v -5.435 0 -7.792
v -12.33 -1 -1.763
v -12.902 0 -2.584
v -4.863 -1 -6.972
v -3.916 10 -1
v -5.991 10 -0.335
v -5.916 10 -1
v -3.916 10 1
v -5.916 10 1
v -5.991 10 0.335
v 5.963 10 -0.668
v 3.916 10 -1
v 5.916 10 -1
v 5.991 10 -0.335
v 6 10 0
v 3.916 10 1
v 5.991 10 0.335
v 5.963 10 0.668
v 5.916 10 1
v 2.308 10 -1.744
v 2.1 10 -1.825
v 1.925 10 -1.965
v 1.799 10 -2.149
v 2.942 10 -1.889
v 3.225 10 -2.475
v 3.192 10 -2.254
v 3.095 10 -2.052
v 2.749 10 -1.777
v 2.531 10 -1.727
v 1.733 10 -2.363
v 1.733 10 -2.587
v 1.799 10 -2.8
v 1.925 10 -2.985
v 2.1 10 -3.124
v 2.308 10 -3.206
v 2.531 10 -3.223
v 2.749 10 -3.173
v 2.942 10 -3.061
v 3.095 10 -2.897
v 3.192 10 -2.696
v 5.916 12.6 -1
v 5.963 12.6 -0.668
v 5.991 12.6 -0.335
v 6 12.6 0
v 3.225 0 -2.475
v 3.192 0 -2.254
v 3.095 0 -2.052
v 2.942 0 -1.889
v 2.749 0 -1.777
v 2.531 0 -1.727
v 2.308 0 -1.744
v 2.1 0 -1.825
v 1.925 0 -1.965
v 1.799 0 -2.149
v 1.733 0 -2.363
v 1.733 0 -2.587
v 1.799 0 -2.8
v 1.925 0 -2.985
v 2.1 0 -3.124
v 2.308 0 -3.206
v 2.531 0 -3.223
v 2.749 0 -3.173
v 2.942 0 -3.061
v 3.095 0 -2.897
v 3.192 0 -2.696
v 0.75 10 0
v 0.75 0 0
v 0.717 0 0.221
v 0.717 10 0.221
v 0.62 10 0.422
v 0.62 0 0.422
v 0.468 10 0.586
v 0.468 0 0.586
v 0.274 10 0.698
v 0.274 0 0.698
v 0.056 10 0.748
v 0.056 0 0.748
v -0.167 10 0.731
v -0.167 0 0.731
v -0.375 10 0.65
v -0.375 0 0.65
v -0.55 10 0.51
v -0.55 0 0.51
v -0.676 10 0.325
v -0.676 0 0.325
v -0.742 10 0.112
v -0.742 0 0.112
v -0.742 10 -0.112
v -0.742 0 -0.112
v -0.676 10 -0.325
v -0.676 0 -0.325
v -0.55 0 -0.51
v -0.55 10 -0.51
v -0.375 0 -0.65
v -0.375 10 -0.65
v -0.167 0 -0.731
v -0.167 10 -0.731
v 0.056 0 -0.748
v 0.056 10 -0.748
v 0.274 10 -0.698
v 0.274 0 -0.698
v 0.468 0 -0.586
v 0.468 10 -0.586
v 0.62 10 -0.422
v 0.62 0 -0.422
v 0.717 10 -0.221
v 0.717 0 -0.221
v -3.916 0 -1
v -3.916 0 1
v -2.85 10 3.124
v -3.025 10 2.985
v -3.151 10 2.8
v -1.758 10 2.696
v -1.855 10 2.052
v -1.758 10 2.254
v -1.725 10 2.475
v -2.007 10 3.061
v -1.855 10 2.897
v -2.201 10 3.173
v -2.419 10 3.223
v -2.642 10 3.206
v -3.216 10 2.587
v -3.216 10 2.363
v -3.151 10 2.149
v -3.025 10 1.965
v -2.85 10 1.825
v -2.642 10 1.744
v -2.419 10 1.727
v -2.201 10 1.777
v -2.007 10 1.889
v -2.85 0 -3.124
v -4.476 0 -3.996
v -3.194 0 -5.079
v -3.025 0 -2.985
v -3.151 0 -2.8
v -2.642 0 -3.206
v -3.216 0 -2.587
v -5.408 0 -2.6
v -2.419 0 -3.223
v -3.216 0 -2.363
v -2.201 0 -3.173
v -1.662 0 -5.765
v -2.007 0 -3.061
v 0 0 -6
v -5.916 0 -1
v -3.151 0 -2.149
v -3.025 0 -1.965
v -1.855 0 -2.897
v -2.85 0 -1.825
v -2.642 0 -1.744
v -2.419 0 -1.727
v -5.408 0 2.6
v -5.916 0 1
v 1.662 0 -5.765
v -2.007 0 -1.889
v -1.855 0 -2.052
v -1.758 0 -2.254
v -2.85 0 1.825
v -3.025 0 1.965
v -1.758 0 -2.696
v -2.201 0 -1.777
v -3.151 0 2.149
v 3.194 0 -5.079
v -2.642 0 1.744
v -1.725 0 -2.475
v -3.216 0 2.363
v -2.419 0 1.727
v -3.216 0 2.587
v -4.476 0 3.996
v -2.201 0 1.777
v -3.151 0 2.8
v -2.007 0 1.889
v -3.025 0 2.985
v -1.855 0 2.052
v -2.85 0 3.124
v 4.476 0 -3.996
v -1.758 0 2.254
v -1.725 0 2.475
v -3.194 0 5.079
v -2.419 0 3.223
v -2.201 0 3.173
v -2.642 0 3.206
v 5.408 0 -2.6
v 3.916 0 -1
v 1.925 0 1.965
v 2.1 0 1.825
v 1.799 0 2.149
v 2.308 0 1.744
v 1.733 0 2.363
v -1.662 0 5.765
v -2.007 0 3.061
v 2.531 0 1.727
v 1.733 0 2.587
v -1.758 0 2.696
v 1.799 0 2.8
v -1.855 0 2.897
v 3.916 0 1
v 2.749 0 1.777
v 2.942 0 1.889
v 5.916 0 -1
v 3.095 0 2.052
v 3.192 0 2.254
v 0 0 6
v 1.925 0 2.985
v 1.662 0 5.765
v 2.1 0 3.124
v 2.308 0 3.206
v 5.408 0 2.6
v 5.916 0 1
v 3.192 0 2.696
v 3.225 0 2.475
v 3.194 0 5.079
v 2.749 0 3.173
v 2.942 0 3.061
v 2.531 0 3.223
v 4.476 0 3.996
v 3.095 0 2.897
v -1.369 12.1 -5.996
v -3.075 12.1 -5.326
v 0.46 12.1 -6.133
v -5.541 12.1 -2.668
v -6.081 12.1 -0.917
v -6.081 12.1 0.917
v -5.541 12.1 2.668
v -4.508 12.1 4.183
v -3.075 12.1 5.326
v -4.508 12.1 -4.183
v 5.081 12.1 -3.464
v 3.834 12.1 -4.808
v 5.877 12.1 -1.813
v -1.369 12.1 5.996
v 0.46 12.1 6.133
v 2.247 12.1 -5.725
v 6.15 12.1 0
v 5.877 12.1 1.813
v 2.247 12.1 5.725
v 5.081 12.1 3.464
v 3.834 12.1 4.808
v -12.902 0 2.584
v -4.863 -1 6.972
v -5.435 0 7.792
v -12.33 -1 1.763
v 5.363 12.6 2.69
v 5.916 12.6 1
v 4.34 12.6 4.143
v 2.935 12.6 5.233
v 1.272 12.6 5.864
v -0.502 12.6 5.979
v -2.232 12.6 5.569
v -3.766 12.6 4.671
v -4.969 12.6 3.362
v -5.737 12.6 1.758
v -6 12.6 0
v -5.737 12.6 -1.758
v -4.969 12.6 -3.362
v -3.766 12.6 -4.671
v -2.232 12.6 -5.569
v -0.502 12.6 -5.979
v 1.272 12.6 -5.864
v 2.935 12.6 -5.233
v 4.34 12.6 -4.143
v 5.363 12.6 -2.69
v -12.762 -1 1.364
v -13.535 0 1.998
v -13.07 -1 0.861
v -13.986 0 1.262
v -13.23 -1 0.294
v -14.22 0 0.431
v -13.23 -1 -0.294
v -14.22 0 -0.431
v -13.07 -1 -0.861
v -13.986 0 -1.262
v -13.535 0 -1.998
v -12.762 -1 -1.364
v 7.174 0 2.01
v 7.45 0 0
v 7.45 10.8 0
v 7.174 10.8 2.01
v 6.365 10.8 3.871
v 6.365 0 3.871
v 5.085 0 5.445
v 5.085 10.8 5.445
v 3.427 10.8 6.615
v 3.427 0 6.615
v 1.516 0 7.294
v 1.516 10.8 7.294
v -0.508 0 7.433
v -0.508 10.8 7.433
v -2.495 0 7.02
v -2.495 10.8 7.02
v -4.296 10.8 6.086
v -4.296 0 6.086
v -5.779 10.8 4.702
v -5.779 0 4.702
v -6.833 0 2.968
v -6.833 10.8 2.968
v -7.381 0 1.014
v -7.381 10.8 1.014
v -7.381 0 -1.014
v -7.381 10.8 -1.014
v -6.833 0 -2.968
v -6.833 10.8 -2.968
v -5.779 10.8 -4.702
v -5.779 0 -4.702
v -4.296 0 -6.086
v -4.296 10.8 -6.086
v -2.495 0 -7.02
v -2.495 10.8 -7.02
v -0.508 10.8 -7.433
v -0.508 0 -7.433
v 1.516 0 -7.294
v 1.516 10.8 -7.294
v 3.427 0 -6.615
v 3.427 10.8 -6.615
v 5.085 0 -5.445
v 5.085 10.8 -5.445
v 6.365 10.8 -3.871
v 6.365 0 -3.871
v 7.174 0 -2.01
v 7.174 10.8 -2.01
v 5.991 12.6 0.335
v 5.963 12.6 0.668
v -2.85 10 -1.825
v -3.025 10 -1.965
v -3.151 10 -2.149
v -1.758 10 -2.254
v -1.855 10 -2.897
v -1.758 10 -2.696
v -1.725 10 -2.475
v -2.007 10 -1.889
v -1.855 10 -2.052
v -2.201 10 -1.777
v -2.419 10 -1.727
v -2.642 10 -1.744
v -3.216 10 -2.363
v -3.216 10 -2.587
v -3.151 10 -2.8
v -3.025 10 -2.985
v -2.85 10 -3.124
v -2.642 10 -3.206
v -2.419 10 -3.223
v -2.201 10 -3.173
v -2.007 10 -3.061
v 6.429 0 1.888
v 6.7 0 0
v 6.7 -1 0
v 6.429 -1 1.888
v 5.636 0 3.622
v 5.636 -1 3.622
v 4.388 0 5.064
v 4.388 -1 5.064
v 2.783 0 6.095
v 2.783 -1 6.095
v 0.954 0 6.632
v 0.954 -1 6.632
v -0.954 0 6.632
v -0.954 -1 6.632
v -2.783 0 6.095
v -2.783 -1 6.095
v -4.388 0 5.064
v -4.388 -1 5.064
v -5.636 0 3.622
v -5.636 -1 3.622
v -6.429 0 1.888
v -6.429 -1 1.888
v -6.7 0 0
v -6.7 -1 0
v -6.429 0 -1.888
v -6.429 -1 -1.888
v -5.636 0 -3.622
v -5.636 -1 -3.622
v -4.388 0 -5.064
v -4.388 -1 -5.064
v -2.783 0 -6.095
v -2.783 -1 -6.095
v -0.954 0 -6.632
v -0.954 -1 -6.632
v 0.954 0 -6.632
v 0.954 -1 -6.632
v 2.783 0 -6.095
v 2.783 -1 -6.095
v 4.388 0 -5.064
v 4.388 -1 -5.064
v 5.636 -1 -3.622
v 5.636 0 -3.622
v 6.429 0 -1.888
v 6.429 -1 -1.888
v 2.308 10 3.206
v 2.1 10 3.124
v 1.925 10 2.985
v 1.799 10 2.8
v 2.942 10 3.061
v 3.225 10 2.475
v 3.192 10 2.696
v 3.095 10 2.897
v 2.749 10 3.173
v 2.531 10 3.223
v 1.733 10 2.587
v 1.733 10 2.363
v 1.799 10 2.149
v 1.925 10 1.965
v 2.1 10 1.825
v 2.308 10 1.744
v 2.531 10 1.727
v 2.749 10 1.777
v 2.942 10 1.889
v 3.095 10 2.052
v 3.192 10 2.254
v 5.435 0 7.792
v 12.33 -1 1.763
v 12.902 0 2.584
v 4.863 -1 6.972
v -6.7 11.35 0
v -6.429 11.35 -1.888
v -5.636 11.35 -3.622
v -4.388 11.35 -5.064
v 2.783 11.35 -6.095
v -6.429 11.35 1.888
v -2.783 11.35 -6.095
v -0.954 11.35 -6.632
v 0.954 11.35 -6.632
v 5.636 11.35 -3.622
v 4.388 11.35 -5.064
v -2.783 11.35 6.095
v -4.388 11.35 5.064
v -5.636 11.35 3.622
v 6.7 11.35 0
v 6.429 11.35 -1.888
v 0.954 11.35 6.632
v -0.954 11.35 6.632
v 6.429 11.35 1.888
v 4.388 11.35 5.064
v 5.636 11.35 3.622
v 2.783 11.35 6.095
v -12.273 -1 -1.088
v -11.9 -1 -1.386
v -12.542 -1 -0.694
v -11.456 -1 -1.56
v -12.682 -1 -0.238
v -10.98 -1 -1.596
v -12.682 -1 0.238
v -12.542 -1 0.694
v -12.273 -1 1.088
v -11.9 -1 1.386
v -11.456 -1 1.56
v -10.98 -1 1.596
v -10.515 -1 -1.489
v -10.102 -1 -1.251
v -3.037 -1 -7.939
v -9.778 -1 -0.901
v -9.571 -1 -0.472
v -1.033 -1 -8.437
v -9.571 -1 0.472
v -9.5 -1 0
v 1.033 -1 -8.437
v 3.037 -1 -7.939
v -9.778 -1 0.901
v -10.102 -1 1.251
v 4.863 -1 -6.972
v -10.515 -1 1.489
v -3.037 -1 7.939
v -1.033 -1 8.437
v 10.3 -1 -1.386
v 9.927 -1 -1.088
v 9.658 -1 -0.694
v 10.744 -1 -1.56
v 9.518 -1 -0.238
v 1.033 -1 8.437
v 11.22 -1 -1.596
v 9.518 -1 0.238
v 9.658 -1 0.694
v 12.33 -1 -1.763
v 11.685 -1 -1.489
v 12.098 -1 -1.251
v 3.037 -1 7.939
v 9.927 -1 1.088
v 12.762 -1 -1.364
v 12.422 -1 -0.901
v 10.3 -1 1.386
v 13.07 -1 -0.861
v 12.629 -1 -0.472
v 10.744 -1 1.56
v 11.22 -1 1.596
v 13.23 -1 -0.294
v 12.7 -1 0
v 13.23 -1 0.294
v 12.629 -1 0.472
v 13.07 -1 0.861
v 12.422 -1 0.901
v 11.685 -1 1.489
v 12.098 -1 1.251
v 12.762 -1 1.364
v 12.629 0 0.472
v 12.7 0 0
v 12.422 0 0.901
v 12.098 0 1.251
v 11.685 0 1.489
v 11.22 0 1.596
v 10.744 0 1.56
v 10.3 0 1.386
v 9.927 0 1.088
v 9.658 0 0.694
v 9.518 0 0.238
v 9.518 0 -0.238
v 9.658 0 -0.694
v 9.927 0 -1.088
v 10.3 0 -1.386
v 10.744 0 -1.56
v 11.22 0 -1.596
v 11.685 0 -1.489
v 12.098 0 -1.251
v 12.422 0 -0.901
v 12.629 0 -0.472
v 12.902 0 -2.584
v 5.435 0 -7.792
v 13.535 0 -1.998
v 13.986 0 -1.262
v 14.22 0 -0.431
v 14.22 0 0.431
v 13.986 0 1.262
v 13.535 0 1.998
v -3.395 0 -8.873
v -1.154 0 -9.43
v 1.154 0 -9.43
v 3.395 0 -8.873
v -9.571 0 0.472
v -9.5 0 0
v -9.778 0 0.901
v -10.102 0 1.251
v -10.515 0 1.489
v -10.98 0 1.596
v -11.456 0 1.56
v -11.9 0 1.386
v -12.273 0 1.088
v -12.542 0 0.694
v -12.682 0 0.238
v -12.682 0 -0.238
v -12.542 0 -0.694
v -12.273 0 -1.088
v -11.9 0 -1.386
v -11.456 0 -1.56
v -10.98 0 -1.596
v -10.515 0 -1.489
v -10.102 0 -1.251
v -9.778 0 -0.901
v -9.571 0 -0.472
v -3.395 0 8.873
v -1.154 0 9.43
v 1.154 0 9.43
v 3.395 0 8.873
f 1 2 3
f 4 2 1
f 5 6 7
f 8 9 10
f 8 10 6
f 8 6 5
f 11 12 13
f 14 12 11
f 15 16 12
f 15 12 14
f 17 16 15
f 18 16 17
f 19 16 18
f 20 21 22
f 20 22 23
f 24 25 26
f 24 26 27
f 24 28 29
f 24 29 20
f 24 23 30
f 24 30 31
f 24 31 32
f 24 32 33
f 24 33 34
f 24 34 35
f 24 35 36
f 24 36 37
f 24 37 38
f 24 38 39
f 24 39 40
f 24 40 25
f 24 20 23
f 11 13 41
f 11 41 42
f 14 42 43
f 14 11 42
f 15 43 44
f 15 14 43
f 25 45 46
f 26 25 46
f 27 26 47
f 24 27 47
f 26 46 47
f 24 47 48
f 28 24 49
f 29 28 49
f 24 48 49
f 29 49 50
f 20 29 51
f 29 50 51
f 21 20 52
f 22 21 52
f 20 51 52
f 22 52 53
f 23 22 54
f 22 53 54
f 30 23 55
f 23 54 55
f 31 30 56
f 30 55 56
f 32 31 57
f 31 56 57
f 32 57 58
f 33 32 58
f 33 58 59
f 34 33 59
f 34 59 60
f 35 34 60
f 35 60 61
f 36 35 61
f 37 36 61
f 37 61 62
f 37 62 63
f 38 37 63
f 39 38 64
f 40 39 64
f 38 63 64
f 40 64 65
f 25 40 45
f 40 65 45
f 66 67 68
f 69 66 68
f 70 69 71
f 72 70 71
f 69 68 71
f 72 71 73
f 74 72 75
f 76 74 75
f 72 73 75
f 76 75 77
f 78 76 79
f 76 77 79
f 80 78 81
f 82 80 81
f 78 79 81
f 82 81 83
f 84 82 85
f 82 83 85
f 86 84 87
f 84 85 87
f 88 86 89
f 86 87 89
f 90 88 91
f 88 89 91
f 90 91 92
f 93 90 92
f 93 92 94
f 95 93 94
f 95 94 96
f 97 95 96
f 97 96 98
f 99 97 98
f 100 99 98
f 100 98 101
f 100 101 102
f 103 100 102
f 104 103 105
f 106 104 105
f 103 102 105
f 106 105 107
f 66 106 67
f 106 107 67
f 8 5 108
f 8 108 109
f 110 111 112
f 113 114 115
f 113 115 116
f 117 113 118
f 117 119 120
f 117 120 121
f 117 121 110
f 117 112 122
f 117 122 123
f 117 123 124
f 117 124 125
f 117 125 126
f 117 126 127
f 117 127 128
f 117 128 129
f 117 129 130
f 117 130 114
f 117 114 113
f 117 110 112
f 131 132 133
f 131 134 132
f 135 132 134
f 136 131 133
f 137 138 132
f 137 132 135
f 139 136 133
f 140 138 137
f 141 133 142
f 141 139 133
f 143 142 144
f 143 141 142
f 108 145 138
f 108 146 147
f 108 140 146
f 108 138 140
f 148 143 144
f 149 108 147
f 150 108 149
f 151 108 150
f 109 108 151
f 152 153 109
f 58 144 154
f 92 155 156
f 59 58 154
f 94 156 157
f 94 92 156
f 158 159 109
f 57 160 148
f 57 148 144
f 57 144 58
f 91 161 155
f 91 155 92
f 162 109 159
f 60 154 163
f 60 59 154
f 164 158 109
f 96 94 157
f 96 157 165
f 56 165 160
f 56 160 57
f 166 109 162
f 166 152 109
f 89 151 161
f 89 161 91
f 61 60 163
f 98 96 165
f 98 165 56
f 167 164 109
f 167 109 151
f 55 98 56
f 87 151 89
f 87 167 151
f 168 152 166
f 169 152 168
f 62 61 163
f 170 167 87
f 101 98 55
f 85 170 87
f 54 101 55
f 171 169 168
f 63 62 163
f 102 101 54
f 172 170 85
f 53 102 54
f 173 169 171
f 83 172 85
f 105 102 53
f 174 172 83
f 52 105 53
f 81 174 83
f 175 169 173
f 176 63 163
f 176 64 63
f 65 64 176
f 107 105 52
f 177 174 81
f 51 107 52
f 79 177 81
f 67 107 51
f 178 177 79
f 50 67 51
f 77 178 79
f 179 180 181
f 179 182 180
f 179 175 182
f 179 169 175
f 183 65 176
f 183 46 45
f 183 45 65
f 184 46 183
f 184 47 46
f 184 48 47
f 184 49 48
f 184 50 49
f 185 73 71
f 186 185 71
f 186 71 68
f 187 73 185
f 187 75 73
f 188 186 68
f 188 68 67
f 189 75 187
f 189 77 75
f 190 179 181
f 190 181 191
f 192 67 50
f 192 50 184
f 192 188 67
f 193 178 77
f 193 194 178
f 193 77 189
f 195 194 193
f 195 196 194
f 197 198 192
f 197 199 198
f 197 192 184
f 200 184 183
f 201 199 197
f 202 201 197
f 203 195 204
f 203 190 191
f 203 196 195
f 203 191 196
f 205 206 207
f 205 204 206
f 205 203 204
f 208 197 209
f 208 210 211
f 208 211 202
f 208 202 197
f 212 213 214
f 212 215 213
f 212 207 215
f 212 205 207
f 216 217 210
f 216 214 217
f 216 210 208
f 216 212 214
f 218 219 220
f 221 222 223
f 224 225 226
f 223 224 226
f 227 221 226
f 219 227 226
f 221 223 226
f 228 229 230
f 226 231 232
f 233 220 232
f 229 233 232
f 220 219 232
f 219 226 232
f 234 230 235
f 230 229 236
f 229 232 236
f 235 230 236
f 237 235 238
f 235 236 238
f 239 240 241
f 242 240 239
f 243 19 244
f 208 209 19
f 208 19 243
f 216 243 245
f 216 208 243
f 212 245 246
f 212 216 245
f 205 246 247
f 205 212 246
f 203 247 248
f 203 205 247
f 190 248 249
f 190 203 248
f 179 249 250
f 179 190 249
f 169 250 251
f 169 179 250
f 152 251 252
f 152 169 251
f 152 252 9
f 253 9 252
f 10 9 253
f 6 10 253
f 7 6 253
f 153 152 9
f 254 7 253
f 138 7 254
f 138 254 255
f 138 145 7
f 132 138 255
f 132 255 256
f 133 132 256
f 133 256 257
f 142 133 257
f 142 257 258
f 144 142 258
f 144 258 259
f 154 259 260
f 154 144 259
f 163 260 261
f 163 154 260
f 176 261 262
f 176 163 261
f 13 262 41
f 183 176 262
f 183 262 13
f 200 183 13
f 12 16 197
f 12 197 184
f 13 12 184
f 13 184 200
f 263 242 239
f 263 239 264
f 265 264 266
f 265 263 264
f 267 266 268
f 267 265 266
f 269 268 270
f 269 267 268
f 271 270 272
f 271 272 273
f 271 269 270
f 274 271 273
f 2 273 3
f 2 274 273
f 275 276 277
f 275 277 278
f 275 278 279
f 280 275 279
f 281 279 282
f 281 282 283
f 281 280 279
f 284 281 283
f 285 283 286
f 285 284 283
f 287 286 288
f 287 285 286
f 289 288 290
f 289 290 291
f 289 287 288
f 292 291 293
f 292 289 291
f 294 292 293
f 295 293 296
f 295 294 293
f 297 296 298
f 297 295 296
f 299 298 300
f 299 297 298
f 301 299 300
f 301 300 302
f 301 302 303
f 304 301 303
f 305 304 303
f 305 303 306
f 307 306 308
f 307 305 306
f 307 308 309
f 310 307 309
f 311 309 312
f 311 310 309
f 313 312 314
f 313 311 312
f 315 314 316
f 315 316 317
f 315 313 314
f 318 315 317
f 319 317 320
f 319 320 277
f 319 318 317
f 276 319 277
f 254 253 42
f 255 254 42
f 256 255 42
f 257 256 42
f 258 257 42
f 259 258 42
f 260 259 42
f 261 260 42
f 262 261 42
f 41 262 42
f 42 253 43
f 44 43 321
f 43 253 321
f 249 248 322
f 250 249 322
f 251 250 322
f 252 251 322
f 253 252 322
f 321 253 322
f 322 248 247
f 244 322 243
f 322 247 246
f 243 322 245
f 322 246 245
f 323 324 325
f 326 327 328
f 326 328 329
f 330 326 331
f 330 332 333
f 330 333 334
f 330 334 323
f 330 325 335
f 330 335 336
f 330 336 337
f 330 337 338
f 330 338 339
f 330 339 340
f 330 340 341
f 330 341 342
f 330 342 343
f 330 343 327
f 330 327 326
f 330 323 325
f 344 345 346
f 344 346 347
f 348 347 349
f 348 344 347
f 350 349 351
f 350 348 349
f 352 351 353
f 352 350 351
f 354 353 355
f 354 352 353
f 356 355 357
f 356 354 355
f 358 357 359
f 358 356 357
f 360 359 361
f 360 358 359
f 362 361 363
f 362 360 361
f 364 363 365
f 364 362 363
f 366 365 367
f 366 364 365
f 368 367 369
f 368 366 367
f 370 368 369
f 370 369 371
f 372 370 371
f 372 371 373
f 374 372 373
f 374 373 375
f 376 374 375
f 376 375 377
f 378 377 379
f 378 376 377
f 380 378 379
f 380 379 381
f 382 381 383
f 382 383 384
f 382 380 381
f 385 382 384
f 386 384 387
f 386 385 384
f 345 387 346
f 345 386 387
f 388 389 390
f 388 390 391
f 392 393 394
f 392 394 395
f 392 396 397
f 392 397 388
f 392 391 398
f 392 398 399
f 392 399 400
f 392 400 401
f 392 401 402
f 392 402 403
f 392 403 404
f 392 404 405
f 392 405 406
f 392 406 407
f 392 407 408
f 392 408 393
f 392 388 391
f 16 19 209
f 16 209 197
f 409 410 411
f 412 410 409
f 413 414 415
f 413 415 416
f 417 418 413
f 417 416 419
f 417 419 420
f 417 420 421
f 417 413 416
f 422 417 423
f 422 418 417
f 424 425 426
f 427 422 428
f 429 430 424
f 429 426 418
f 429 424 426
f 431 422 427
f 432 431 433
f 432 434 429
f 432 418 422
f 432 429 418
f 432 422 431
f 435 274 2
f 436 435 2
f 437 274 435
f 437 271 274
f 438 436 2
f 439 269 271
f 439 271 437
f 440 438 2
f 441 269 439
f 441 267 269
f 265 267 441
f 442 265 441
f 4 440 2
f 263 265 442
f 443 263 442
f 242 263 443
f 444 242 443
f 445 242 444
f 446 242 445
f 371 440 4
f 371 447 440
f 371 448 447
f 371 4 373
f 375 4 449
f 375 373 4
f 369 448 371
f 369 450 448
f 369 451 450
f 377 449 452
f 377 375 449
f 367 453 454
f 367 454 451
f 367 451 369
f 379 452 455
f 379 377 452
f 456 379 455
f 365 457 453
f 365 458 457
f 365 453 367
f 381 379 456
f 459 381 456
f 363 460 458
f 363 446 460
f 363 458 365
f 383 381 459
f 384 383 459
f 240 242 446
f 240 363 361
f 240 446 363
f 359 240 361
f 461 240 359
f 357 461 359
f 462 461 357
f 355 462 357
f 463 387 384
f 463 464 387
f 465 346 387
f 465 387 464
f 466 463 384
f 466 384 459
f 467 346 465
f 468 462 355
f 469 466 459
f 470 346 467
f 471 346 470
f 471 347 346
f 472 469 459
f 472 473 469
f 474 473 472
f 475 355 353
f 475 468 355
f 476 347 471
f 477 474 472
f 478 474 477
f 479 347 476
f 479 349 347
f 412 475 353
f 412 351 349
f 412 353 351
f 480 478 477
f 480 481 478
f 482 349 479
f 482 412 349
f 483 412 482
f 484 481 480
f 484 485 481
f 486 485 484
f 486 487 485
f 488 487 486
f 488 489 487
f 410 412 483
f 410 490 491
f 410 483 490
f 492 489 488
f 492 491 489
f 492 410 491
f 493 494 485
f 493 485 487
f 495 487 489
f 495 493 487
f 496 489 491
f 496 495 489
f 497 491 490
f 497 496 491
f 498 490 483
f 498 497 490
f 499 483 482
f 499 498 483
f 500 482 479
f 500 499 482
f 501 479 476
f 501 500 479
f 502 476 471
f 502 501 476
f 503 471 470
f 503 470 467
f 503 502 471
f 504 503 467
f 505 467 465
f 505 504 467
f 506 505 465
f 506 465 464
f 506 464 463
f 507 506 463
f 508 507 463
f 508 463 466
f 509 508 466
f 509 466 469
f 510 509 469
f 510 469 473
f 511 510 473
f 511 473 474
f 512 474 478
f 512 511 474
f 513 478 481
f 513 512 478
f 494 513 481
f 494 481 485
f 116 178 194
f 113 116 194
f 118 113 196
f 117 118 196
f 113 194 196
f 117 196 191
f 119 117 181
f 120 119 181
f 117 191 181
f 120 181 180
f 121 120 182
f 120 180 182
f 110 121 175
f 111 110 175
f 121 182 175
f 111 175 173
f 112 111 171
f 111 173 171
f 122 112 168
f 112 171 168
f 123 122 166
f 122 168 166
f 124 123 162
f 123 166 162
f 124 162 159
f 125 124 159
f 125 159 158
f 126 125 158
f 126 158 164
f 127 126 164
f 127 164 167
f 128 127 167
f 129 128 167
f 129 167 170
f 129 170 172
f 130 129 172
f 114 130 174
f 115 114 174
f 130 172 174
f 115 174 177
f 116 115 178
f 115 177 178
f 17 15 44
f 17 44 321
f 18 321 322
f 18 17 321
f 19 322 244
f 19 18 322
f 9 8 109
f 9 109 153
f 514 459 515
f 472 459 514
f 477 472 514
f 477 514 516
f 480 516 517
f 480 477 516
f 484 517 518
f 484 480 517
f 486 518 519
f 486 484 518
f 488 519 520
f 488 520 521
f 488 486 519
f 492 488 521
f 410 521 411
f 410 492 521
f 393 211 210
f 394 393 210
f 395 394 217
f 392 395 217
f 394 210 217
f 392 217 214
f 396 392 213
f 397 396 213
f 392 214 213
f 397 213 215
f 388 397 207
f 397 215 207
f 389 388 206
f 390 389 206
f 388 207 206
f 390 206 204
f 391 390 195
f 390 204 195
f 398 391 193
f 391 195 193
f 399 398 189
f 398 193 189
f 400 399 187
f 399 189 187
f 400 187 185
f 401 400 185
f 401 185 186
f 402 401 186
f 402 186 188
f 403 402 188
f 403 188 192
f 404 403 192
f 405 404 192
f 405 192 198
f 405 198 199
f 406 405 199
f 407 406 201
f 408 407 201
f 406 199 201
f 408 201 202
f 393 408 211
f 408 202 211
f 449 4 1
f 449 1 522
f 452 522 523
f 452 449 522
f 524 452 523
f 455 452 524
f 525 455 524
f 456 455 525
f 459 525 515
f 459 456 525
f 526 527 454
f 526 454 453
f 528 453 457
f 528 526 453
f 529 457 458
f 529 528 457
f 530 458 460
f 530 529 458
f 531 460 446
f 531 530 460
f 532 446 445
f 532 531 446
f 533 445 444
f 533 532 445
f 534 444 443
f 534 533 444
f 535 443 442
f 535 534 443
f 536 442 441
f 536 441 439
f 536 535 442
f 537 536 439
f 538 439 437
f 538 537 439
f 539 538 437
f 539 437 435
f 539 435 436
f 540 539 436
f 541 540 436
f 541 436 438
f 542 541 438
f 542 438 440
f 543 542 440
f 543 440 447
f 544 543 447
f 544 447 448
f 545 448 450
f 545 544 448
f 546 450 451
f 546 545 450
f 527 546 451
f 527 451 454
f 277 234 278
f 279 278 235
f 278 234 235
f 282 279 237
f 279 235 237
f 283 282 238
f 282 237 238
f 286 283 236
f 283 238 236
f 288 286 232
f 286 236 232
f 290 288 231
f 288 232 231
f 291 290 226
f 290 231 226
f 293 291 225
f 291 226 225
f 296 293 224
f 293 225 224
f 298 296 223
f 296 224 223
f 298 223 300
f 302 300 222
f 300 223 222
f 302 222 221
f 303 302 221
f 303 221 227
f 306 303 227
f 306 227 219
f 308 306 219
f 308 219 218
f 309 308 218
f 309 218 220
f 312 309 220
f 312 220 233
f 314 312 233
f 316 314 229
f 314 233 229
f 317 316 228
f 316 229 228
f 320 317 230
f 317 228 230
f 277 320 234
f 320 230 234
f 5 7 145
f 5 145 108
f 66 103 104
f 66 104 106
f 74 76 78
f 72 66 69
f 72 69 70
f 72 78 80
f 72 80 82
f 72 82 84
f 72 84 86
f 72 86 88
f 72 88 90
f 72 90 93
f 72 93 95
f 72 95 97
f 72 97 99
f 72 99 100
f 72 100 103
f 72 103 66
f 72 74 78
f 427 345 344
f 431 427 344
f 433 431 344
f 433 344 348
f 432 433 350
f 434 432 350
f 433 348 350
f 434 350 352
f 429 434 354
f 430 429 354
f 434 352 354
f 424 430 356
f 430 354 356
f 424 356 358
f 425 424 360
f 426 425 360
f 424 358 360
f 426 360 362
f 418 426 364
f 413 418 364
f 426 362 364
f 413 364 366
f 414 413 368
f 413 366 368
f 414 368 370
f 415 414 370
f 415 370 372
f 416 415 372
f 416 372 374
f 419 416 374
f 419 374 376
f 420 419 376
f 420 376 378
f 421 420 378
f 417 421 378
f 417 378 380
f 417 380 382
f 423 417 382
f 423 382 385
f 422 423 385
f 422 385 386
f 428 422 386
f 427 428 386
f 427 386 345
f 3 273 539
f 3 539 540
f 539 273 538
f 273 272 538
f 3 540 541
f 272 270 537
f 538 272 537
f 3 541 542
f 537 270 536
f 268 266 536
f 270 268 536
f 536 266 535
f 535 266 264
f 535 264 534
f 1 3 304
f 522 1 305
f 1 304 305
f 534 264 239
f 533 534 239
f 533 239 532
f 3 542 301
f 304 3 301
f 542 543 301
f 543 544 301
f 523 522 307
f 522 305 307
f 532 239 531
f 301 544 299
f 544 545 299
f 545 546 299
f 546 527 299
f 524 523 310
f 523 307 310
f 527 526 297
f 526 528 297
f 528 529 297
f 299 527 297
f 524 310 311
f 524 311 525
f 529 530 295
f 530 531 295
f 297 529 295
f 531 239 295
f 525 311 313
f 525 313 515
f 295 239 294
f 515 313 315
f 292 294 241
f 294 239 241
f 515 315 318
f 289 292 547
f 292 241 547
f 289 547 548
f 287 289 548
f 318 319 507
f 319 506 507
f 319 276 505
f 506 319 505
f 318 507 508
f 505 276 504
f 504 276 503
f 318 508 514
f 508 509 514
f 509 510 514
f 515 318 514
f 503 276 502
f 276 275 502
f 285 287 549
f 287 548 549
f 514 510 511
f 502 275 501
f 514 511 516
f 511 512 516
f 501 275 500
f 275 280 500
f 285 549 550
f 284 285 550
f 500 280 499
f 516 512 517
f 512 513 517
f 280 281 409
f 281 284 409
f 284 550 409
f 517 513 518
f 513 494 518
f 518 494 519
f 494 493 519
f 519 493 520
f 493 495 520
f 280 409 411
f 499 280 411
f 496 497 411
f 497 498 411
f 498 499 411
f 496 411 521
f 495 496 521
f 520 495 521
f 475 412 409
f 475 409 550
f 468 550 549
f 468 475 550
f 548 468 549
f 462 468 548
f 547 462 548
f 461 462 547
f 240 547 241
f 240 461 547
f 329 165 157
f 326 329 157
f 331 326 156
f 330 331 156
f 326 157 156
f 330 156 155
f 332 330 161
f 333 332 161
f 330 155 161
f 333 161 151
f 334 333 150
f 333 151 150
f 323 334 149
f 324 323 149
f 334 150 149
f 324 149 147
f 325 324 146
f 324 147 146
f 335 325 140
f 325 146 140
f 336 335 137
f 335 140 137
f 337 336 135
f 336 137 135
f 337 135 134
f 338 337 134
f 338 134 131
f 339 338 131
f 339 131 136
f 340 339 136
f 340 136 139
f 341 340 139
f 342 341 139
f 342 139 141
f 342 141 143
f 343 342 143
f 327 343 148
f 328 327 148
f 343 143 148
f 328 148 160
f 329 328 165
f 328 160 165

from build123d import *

# Parameters (mm, degrees)
F0_R     = 1.6
F0_R_2   = 7.45
F0_R_3   = 6.7
F1_DEPTH = 1
F2_SIZE  = 0.99999
F0_R_4   = 0.75
F3_DEPTH = 12.1
F4_T     = 0.75
F5_DEPTH = 12.6
F6_DEPTH = 10
F7_SIZE  = 1.3


# Not quite as in the source:
# - a fillet or chamfer is up to 0.001 mm smaller than in the source, because OpenCascade refuses the exact size
# - a shell that OpenCascade refuses in one call is made with other operations: the cavity is built on its own and cut out
# - a feature names something its author has since deleted; it is built from what else it names


with BuildPart() as f1:
    # F0 (on Front) → F1 (new body)
    with BuildSketch(Plane.XZ):
        with BuildLine():
            Line((-5.4346846847, 7.7919318771), (-12.902027027, 2.5836405698))
            ThreePointArc((-12.902027027, 2.5836405698), (-14.25, 0), (-12.902027027, -2.5836405698))
            Line((-12.902027027, -2.5836405698), (-5.4346846847, -7.7919318771))
            ThreePointArc((-5.4346846847, -7.7919318771), (0, -9.5), (5.4346846847, -7.7919318771))
            Line((5.4346846847, -7.7919318771), (12.902027027, -2.5836405698))
            ThreePointArc((12.902027027, -2.5836405698), (14.25, 0), (12.902027027, 2.5836405698))
            Line((12.902027027, 2.5836405698), (5.4346846847, 7.7919318771))
            ThreePointArc((5.4346846847, 7.7919318771), (0, 9.5), (-5.4346846847, 7.7919318771))
        make_face()
        with Locations((-11.1, 0)):
            Circle(F0_R, mode=Mode.SUBTRACT)
        Circle(F0_R_2, mode=Mode.SUBTRACT)
        with Locations((11.1, 0)):
            Circle(F0_R, mode=Mode.SUBTRACT)
        Circle(F0_R_2)
        Circle(F0_R_3, mode=Mode.SUBTRACT)
    extrude(amount=F1_DEPTH)

    # F2 (size 1 in the source; OpenCascade refuses exactly that, so slightly less here)
    f2_edges = [f1.edges().sort_by_distance(p)[0] for p in [
        (-9.168356, -1, 5.187786),
        (0, -1, 9.5),
        (-14.25, -1, 0),
        (-9.168356, -1, -5.187786),
        (0, -1, -9.5),
        (9.168356, -1, -5.187786),
        (14.25, -1, 0),
        (9.168356, -1, 5.187786),
    ]]
    chamfer(f2_edges, length=F2_SIZE)

    # F0 (on Front) → F3 (join)
    with BuildSketch(Plane.XZ):
        Circle(F0_R_2)
        Circle(F0_R_3, mode=Mode.SUBTRACT)
        Circle(F0_R_3)
        with BuildLine():
            ThreePointArc((5.9160797831, 1), (5.9789831367, 0.5017575617), (6, 0))
            ThreePointArc((6, 0), (5.9789831367, -0.5017575617), (5.9160797831, -1))
            ThreePointArc((5.9160797831, -1), (0, -6), (-5.9160797831, -1))
            ThreePointArc((-5.9160797831, -1), (-6, 0), (-5.9160797831, 1))
            ThreePointArc((-5.9160797831, 1), (0, 6), (5.9160797831, 1))
        make_face(mode=Mode.SUBTRACT)
        with BuildLine():
            Line((3.9160797831, 1), (5.9160797831, 1))
            ThreePointArc((5.9160797831, 1), (0, 6), (-5.9160797831, 1))
            Line((-5.9160797831, 1), (-3.9160797831, 1))
            Line((-3.9160797831, 1), (-3.9160797831, -1))
            Line((-3.9160797831, -1), (-5.9160797831, -1))
            ThreePointArc((-5.9160797831, -1), (0, -6), (5.9160797831, -1))
            Line((5.9160797831, -1), (3.9160797831, -1))
            Line((3.9160797831, -1), (3.9160797831, 1))
        make_face()
        with Locations((-2.4748737342, -2.4748737342)):
            Circle(F0_R_4, mode=Mode.SUBTRACT)
        with Locations((2.4748737342, -2.4748737342)):
            Circle(F0_R_4, mode=Mode.SUBTRACT)
        with Locations((-2.4748737342, 2.4748737342)):
            Circle(F0_R_4, mode=Mode.SUBTRACT)
        Circle(F0_R_4, mode=Mode.SUBTRACT)
        with Locations((2.4748737342, 2.4748737342)):
            Circle(F0_R_4, mode=Mode.SUBTRACT)
        with Locations((-2.4748737342, -2.4748737342)):
            Circle(F0_R_4)
        with Locations((2.4748737342, -2.4748737342)):
            Circle(F0_R_4)
        with Locations((-2.4748737342, 2.4748737342)):
            Circle(F0_R_4)
        with Locations((2.4748737342, 2.4748737342)):
            Circle(F0_R_4)
        with BuildLine():
            Line((-3.9160797831, 1), (-5.9160797831, 1))
            ThreePointArc((-5.9160797831, 1), (-6, 0), (-5.9160797831, -1))
            Line((-5.9160797831, -1), (-3.9160797831, -1))
            Line((-3.9160797831, -1), (-3.9160797831, 1))
        make_face()
        with BuildLine():
            ThreePointArc((5.9160797831, -1), (5.9789831367, -0.5017575617), (6, 0))
            ThreePointArc((6, 0), (5.9789831367, 0.5017575617), (5.9160797831, 1))
            Line((5.9160797831, 1), (3.9160797831, 1))
            Line((3.9160797831, 1), (3.9160797831, -1))
            Line((3.9160797831, -1), (5.9160797831, -1))
        make_face()
        Circle(F0_R_4)
    extrude(amount=-F3_DEPTH)

    # F4: shell of thickness 0.75, made by hand


with BuildPart() as f4_core1:
    # F4_t2: copy of F1
    add(f1.part)

    # the walls: a layer under each face that stays
    f4_faces = [f4_core1.faces().sort_by_distance(p)[0] for p in [
        (0, -5e-06, 9.5),
        (9.1683558559, -5e-06, 5.1877862235),
        (0, -0.500005, 9.000005),
        (-12.2142857143, 0, -2.7142857143),
        (-9.1683558559, -5e-06, 5.1877862235),
        (14.25, -5e-06, 0),
        (8.8823226802, -0.500005, 4.7776886467),
        (-8.83334, -1, 0),
        (-8.8823226802, -0.500005, 4.7776886467),
        (-14.25, -5e-06, 0),
        (9.1683558559, -5e-06, -5.1877862235),
        (-9.1683558559, -5e-06, -5.1877862235),
        (0, -5e-06, -9.5),
        (-12.7, -0.5, 0),
        (-7.45, 6.05, 0),
        (9.5, -0.5, 0),
        (13.750005, -0.500005, 0),
        (-13.750005, -0.500005, 0),
        (-8.8823226802, -0.500005, -4.7776886467),
        (0, -0.500005, -9.000005),
        (8.8823226802, -0.500005, -4.7776886467),
        (-6.7, -0.5, 0),
        (0, 12.1, 0),
    ]]
    thicken(f4_faces, amount=-F4_T, mode=Mode.SUBTRACT)

    # F4_s3 → F4_t4 (revolve, cut)
    with BuildSketch(Plane.XY):
        Polygon((7.4575, 0.0075), (7.45, -0.75), (6.7, -0.75), (6.7, 0), align=None)
    revolve(axis=Axis((0, 0, 0), (0, -1, 0)), mode=Mode.SUBTRACT)


with BuildPart() as f1_1:
    add(f1.part)

    # what is left inside the walls is the cavity
    f4_cavity = [f4_core1.part.solids().sort_by_distance(p)[0] for p in [
        (-6.6925, 7.566667, 0),
    ]]
    add(f4_cavity, mode=Mode.SUBTRACT)

    # F7
    f7_edges = [f1_1.edges().sort_by_distance(p)[0] for p in [
        (-7.45, 12.1, 0),
    ]]
    chamfer(f7_edges, length=F7_SIZE)


with BuildPart() as f5:
    # F0 (on Front) → F5 (new body)
    with BuildSketch(Plane.XZ):
        with BuildLine():
            Line((3.9160797831, 1), (5.9160797831, 1))
            ThreePointArc((5.9160797831, 1), (0, 6), (-5.9160797831, 1))
            Line((-5.9160797831, 1), (-3.9160797831, 1))
            Line((-3.9160797831, 1), (-3.9160797831, -1))
            Line((-3.9160797831, -1), (-5.9160797831, -1))
            ThreePointArc((-5.9160797831, -1), (0, -6), (5.9160797831, -1))
            Line((5.9160797831, -1), (3.9160797831, -1))
            Line((3.9160797831, -1), (3.9160797831, 1))
        make_face()
        with Locations((-2.4748737342, -2.4748737342)):
            Circle(F0_R_4, mode=Mode.SUBTRACT)
        with Locations((2.4748737342, -2.4748737342)):
            Circle(F0_R_4, mode=Mode.SUBTRACT)
        with Locations((-2.4748737342, 2.4748737342)):
            Circle(F0_R_4, mode=Mode.SUBTRACT)
        Circle(F0_R_4, mode=Mode.SUBTRACT)
        with Locations((2.4748737342, 2.4748737342)):
            Circle(F0_R_4, mode=Mode.SUBTRACT)
        with BuildLine():
            Line((-3.9160797831, 1), (-5.9160797831, 1))
            ThreePointArc((-5.9160797831, 1), (-6, 0), (-5.9160797831, -1))
            Line((-5.9160797831, -1), (-3.9160797831, -1))
            Line((-3.9160797831, -1), (-3.9160797831, 1))
        make_face()
        with BuildLine():
            ThreePointArc((5.9160797831, -1), (5.9789831367, -0.5017575617), (6, 0))
            ThreePointArc((6, 0), (5.9789831367, 0.5017575617), (5.9160797831, 1))
            Line((5.9160797831, 1), (3.9160797831, 1))
            Line((3.9160797831, 1), (3.9160797831, -1))
            Line((3.9160797831, -1), (5.9160797831, -1))
        make_face()
        with Locations((-2.4748737342, 2.4748737342)):
            Circle(F0_R_4)
        with Locations((2.4748737342, 2.4748737342)):
            Circle(F0_R_4)
        with Locations((-2.4748737342, -2.4748737342)):
            Circle(F0_R_4)
        with Locations((2.4748737342, -2.4748737342)):
            Circle(F0_R_4)
        Circle(F0_R_4)
    extrude(amount=-F5_DEPTH)

    # F0 (on Front) → F6 (cut)
    with BuildSketch(Plane.XZ):
        with Locations((-2.4748737342, -2.4748737342)):
            Circle(F0_R_4)
        with Locations((-2.4748737342, 2.4748737342)):
            Circle(F0_R_4)
        with Locations((2.4748737342, 2.4748737342)):
            Circle(F0_R_4)
        with Locations((2.4748737342, -2.4748737342)):
            Circle(F0_R_4)
        Circle(F0_R_4)
        with BuildLine():
            Line((-3.9160797831, 1), (-5.9160797831, 1))
            ThreePointArc((-5.9160797831, 1), (-6, 0), (-5.9160797831, -1))
            Line((-5.9160797831, -1), (-3.9160797831, -1))
            Line((-3.9160797831, -1), (-3.9160797831, 1))
        make_face()
        with BuildLine():
            ThreePointArc((5.9160797831, -1), (5.9789831367, -0.5017575617), (6, 0))
            ThreePointArc((6, 0), (5.9789831367, 0.5017575617), (5.9160797831, 1))
            Line((5.9160797831, 1), (3.9160797831, 1))
            Line((3.9160797831, 1), (3.9160797831, -1))
            Line((3.9160797831, -1), (5.9160797831, -1))
        make_face()
    extrude(amount=-F6_DEPTH, mode=Mode.SUBTRACT)


solid = Compound([f1_1.part, f5.part])
